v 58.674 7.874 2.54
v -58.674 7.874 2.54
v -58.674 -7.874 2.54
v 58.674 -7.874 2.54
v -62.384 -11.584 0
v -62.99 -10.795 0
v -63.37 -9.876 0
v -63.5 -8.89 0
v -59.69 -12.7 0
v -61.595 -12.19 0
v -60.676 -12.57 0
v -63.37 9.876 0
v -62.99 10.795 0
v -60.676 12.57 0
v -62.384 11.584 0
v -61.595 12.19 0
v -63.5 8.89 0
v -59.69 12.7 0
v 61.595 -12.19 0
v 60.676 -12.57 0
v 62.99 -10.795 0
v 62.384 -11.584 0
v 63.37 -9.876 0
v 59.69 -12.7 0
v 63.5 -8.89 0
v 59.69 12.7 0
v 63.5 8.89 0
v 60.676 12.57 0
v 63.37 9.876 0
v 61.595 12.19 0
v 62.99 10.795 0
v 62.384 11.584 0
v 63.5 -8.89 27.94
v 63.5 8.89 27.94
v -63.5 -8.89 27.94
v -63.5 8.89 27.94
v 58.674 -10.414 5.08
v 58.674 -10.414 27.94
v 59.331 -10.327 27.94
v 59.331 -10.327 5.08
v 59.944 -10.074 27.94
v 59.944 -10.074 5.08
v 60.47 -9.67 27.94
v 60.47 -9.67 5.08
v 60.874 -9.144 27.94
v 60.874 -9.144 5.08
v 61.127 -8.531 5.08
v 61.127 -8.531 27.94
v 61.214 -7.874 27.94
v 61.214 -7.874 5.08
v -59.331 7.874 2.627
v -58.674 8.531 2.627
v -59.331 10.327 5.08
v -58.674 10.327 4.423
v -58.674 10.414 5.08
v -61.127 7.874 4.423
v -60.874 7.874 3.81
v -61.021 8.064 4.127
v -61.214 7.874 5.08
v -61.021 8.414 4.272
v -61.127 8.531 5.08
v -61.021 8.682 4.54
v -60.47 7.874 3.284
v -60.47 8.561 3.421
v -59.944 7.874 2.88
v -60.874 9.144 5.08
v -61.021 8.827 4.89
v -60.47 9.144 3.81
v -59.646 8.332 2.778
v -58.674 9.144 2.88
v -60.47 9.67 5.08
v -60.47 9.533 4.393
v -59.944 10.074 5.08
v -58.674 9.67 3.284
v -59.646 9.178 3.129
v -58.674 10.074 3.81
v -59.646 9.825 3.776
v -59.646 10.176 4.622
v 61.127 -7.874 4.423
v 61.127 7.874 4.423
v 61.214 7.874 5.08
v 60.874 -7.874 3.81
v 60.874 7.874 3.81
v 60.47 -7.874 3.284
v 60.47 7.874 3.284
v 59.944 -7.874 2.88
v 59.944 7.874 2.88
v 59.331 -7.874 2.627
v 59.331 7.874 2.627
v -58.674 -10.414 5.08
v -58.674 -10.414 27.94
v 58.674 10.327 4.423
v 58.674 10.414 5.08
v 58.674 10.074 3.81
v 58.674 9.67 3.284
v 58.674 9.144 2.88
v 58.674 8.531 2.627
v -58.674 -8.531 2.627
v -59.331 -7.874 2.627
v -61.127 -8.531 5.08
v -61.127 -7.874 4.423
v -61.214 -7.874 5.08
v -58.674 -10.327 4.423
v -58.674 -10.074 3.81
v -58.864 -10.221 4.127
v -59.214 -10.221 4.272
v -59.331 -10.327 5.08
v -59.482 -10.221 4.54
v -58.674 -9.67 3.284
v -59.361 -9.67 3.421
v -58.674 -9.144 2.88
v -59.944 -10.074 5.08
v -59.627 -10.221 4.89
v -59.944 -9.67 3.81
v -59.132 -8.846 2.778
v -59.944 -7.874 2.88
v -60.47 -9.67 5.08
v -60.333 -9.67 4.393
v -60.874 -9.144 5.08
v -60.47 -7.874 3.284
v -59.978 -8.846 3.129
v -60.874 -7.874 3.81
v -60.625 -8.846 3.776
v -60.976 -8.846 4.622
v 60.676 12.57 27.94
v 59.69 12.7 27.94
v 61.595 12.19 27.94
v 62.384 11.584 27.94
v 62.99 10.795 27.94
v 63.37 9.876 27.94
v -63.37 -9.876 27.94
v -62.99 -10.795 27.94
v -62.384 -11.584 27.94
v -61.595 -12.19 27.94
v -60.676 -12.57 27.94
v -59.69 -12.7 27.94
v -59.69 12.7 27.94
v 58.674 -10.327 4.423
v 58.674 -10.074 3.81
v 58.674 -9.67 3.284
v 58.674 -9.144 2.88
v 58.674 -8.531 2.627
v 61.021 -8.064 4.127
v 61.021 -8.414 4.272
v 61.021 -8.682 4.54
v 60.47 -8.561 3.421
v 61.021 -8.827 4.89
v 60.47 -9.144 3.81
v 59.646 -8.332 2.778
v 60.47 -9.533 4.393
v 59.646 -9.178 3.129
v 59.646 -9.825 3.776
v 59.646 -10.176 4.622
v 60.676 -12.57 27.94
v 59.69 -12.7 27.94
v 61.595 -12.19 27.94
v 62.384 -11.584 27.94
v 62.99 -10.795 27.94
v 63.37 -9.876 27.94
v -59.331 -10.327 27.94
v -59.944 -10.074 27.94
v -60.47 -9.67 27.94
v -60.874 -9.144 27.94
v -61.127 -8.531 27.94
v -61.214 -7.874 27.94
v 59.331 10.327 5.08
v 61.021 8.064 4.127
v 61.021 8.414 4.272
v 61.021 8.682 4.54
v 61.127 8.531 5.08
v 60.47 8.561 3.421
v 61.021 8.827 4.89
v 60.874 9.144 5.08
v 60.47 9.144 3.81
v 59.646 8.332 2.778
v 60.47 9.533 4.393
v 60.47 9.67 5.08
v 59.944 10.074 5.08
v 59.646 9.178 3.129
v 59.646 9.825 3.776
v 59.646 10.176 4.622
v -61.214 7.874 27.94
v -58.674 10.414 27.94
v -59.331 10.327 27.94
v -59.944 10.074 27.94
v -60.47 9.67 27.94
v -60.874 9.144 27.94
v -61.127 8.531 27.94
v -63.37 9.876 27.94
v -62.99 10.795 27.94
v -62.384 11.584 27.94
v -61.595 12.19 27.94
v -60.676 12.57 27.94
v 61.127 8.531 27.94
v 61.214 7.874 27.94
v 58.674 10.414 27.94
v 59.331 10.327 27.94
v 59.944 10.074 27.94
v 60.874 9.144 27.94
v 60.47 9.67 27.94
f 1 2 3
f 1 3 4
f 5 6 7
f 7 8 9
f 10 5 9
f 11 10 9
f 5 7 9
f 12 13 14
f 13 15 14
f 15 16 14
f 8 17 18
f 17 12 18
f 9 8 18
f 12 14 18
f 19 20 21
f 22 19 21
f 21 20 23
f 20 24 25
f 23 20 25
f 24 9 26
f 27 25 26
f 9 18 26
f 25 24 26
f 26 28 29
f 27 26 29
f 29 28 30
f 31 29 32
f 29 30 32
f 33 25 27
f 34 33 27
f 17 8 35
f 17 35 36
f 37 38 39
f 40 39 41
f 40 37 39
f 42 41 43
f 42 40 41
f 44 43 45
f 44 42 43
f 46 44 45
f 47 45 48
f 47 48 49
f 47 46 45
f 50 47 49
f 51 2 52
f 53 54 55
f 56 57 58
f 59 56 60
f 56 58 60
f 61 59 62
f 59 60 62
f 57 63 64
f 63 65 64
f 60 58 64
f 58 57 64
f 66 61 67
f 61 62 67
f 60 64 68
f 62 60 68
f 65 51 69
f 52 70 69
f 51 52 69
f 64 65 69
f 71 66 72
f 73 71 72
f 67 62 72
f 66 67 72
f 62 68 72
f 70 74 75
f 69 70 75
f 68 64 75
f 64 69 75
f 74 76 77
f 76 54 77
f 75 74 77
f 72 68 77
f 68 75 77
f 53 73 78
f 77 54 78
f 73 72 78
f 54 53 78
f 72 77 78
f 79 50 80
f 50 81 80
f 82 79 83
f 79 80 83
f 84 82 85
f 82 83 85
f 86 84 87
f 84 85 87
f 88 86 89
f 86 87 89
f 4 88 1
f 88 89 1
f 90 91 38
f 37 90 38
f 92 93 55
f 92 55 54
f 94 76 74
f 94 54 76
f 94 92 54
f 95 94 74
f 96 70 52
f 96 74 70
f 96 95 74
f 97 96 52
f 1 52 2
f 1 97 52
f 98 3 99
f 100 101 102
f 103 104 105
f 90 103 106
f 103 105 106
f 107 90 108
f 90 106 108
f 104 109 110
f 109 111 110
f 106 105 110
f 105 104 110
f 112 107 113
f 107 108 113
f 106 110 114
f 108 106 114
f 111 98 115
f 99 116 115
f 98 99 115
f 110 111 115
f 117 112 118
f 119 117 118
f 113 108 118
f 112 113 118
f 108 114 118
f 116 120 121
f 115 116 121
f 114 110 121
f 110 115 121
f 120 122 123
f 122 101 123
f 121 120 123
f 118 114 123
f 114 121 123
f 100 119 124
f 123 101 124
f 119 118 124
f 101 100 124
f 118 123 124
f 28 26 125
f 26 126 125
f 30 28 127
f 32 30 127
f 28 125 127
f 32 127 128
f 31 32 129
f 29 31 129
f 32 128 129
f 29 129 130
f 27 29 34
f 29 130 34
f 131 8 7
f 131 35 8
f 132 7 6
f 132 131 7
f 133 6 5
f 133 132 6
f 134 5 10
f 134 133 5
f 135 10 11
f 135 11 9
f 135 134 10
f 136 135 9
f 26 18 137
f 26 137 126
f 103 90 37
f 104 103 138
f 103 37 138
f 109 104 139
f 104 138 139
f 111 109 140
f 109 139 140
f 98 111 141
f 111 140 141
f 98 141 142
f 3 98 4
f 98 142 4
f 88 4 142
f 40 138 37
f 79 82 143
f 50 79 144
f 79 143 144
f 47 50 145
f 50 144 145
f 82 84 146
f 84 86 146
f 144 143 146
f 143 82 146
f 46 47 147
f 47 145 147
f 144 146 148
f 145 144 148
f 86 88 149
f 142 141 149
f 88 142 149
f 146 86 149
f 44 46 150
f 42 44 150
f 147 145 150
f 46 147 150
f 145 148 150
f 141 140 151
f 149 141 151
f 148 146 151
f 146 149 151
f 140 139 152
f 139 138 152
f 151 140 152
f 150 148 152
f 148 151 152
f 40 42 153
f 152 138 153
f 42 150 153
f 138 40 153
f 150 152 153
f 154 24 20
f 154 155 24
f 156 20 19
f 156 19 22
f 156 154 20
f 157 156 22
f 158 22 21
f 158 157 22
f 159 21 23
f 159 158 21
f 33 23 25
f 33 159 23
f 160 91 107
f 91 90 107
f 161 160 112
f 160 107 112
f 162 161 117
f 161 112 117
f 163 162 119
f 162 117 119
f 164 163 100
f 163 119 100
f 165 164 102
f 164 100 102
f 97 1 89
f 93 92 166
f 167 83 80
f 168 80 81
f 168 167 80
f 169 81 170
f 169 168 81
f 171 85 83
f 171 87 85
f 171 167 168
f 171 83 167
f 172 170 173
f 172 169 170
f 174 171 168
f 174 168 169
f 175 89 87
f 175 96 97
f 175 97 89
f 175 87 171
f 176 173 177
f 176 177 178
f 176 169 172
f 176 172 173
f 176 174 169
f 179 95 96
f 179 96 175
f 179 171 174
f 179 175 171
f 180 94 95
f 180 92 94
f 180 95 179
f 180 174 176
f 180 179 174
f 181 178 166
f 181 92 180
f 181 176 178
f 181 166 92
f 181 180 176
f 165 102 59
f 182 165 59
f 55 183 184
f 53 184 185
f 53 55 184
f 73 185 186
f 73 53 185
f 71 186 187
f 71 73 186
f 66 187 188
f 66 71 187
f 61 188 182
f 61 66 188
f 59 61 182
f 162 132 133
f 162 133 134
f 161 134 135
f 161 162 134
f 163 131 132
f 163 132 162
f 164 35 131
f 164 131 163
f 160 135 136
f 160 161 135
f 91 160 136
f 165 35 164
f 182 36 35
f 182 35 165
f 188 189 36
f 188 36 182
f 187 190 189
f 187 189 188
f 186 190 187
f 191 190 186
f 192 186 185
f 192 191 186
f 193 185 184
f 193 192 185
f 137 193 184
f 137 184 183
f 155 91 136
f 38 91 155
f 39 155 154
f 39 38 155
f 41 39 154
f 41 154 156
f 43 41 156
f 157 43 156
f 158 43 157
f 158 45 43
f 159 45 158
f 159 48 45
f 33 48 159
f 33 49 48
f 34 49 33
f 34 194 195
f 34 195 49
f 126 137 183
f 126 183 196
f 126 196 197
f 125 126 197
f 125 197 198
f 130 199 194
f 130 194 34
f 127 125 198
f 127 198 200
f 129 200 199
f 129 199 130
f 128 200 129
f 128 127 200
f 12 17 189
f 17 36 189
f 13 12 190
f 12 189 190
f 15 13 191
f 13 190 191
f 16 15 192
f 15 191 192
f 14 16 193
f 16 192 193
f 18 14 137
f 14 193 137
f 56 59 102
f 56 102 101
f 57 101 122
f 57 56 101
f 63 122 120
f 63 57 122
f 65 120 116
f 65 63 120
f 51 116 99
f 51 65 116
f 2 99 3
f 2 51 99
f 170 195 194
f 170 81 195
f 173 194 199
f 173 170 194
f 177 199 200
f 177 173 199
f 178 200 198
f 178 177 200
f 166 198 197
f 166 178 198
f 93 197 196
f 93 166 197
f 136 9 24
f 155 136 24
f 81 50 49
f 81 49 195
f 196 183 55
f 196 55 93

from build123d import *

# Parameters (mm, degrees)
F0_W     = 127
F0_H     = 25.4
F1_DEPTH = 27.94
F2_W     = 122.428
F2_H     = 20.828
F3_DEPTH = 25.4
F4_R     = 2.54
F5_R     = 3.81


with BuildPart() as f1:
    # F0 (on Top) → F1 (new body)
    with BuildSketch(Plane.XY):
        Rectangle(F0_W, F0_H)
    extrude(amount=F1_DEPTH)

    # F2 (on face) → F3 (cut)
    with BuildSketch(Plane.XY.offset(27.94)):
        Rectangle(F2_W, F2_H)
    extrude(amount=-F3_DEPTH, mode=Mode.SUBTRACT)

    # F4
    f4_edges = [f1.edges().sort_by_distance(p)[0] for p in [
        (0, 10.414, 2.54),
        (-61.214, 0, 2.54),
        (0, -10.414, 2.54),
        (61.214, 0, 2.54),
        (-61.214, 10.414, 15.24),
        (61.214, 10.414, 15.24),
        (61.214, -10.414, 15.24),
        (-61.214, -10.414, 15.24),
    ]]
    fillet(f4_edges, radius=F4_R)

    # F5
    f5_edges = [f1.edges().sort_by_distance(p)[0] for p in [
        (-63.5, -12.7, 13.97),
        (-63.5, 12.7, 13.97),
        (63.5, 12.7, 13.97),
        (63.5, -12.7, 13.97),
    ]]
    fillet(f5_edges, radius=F5_R)


solid = f1.part
